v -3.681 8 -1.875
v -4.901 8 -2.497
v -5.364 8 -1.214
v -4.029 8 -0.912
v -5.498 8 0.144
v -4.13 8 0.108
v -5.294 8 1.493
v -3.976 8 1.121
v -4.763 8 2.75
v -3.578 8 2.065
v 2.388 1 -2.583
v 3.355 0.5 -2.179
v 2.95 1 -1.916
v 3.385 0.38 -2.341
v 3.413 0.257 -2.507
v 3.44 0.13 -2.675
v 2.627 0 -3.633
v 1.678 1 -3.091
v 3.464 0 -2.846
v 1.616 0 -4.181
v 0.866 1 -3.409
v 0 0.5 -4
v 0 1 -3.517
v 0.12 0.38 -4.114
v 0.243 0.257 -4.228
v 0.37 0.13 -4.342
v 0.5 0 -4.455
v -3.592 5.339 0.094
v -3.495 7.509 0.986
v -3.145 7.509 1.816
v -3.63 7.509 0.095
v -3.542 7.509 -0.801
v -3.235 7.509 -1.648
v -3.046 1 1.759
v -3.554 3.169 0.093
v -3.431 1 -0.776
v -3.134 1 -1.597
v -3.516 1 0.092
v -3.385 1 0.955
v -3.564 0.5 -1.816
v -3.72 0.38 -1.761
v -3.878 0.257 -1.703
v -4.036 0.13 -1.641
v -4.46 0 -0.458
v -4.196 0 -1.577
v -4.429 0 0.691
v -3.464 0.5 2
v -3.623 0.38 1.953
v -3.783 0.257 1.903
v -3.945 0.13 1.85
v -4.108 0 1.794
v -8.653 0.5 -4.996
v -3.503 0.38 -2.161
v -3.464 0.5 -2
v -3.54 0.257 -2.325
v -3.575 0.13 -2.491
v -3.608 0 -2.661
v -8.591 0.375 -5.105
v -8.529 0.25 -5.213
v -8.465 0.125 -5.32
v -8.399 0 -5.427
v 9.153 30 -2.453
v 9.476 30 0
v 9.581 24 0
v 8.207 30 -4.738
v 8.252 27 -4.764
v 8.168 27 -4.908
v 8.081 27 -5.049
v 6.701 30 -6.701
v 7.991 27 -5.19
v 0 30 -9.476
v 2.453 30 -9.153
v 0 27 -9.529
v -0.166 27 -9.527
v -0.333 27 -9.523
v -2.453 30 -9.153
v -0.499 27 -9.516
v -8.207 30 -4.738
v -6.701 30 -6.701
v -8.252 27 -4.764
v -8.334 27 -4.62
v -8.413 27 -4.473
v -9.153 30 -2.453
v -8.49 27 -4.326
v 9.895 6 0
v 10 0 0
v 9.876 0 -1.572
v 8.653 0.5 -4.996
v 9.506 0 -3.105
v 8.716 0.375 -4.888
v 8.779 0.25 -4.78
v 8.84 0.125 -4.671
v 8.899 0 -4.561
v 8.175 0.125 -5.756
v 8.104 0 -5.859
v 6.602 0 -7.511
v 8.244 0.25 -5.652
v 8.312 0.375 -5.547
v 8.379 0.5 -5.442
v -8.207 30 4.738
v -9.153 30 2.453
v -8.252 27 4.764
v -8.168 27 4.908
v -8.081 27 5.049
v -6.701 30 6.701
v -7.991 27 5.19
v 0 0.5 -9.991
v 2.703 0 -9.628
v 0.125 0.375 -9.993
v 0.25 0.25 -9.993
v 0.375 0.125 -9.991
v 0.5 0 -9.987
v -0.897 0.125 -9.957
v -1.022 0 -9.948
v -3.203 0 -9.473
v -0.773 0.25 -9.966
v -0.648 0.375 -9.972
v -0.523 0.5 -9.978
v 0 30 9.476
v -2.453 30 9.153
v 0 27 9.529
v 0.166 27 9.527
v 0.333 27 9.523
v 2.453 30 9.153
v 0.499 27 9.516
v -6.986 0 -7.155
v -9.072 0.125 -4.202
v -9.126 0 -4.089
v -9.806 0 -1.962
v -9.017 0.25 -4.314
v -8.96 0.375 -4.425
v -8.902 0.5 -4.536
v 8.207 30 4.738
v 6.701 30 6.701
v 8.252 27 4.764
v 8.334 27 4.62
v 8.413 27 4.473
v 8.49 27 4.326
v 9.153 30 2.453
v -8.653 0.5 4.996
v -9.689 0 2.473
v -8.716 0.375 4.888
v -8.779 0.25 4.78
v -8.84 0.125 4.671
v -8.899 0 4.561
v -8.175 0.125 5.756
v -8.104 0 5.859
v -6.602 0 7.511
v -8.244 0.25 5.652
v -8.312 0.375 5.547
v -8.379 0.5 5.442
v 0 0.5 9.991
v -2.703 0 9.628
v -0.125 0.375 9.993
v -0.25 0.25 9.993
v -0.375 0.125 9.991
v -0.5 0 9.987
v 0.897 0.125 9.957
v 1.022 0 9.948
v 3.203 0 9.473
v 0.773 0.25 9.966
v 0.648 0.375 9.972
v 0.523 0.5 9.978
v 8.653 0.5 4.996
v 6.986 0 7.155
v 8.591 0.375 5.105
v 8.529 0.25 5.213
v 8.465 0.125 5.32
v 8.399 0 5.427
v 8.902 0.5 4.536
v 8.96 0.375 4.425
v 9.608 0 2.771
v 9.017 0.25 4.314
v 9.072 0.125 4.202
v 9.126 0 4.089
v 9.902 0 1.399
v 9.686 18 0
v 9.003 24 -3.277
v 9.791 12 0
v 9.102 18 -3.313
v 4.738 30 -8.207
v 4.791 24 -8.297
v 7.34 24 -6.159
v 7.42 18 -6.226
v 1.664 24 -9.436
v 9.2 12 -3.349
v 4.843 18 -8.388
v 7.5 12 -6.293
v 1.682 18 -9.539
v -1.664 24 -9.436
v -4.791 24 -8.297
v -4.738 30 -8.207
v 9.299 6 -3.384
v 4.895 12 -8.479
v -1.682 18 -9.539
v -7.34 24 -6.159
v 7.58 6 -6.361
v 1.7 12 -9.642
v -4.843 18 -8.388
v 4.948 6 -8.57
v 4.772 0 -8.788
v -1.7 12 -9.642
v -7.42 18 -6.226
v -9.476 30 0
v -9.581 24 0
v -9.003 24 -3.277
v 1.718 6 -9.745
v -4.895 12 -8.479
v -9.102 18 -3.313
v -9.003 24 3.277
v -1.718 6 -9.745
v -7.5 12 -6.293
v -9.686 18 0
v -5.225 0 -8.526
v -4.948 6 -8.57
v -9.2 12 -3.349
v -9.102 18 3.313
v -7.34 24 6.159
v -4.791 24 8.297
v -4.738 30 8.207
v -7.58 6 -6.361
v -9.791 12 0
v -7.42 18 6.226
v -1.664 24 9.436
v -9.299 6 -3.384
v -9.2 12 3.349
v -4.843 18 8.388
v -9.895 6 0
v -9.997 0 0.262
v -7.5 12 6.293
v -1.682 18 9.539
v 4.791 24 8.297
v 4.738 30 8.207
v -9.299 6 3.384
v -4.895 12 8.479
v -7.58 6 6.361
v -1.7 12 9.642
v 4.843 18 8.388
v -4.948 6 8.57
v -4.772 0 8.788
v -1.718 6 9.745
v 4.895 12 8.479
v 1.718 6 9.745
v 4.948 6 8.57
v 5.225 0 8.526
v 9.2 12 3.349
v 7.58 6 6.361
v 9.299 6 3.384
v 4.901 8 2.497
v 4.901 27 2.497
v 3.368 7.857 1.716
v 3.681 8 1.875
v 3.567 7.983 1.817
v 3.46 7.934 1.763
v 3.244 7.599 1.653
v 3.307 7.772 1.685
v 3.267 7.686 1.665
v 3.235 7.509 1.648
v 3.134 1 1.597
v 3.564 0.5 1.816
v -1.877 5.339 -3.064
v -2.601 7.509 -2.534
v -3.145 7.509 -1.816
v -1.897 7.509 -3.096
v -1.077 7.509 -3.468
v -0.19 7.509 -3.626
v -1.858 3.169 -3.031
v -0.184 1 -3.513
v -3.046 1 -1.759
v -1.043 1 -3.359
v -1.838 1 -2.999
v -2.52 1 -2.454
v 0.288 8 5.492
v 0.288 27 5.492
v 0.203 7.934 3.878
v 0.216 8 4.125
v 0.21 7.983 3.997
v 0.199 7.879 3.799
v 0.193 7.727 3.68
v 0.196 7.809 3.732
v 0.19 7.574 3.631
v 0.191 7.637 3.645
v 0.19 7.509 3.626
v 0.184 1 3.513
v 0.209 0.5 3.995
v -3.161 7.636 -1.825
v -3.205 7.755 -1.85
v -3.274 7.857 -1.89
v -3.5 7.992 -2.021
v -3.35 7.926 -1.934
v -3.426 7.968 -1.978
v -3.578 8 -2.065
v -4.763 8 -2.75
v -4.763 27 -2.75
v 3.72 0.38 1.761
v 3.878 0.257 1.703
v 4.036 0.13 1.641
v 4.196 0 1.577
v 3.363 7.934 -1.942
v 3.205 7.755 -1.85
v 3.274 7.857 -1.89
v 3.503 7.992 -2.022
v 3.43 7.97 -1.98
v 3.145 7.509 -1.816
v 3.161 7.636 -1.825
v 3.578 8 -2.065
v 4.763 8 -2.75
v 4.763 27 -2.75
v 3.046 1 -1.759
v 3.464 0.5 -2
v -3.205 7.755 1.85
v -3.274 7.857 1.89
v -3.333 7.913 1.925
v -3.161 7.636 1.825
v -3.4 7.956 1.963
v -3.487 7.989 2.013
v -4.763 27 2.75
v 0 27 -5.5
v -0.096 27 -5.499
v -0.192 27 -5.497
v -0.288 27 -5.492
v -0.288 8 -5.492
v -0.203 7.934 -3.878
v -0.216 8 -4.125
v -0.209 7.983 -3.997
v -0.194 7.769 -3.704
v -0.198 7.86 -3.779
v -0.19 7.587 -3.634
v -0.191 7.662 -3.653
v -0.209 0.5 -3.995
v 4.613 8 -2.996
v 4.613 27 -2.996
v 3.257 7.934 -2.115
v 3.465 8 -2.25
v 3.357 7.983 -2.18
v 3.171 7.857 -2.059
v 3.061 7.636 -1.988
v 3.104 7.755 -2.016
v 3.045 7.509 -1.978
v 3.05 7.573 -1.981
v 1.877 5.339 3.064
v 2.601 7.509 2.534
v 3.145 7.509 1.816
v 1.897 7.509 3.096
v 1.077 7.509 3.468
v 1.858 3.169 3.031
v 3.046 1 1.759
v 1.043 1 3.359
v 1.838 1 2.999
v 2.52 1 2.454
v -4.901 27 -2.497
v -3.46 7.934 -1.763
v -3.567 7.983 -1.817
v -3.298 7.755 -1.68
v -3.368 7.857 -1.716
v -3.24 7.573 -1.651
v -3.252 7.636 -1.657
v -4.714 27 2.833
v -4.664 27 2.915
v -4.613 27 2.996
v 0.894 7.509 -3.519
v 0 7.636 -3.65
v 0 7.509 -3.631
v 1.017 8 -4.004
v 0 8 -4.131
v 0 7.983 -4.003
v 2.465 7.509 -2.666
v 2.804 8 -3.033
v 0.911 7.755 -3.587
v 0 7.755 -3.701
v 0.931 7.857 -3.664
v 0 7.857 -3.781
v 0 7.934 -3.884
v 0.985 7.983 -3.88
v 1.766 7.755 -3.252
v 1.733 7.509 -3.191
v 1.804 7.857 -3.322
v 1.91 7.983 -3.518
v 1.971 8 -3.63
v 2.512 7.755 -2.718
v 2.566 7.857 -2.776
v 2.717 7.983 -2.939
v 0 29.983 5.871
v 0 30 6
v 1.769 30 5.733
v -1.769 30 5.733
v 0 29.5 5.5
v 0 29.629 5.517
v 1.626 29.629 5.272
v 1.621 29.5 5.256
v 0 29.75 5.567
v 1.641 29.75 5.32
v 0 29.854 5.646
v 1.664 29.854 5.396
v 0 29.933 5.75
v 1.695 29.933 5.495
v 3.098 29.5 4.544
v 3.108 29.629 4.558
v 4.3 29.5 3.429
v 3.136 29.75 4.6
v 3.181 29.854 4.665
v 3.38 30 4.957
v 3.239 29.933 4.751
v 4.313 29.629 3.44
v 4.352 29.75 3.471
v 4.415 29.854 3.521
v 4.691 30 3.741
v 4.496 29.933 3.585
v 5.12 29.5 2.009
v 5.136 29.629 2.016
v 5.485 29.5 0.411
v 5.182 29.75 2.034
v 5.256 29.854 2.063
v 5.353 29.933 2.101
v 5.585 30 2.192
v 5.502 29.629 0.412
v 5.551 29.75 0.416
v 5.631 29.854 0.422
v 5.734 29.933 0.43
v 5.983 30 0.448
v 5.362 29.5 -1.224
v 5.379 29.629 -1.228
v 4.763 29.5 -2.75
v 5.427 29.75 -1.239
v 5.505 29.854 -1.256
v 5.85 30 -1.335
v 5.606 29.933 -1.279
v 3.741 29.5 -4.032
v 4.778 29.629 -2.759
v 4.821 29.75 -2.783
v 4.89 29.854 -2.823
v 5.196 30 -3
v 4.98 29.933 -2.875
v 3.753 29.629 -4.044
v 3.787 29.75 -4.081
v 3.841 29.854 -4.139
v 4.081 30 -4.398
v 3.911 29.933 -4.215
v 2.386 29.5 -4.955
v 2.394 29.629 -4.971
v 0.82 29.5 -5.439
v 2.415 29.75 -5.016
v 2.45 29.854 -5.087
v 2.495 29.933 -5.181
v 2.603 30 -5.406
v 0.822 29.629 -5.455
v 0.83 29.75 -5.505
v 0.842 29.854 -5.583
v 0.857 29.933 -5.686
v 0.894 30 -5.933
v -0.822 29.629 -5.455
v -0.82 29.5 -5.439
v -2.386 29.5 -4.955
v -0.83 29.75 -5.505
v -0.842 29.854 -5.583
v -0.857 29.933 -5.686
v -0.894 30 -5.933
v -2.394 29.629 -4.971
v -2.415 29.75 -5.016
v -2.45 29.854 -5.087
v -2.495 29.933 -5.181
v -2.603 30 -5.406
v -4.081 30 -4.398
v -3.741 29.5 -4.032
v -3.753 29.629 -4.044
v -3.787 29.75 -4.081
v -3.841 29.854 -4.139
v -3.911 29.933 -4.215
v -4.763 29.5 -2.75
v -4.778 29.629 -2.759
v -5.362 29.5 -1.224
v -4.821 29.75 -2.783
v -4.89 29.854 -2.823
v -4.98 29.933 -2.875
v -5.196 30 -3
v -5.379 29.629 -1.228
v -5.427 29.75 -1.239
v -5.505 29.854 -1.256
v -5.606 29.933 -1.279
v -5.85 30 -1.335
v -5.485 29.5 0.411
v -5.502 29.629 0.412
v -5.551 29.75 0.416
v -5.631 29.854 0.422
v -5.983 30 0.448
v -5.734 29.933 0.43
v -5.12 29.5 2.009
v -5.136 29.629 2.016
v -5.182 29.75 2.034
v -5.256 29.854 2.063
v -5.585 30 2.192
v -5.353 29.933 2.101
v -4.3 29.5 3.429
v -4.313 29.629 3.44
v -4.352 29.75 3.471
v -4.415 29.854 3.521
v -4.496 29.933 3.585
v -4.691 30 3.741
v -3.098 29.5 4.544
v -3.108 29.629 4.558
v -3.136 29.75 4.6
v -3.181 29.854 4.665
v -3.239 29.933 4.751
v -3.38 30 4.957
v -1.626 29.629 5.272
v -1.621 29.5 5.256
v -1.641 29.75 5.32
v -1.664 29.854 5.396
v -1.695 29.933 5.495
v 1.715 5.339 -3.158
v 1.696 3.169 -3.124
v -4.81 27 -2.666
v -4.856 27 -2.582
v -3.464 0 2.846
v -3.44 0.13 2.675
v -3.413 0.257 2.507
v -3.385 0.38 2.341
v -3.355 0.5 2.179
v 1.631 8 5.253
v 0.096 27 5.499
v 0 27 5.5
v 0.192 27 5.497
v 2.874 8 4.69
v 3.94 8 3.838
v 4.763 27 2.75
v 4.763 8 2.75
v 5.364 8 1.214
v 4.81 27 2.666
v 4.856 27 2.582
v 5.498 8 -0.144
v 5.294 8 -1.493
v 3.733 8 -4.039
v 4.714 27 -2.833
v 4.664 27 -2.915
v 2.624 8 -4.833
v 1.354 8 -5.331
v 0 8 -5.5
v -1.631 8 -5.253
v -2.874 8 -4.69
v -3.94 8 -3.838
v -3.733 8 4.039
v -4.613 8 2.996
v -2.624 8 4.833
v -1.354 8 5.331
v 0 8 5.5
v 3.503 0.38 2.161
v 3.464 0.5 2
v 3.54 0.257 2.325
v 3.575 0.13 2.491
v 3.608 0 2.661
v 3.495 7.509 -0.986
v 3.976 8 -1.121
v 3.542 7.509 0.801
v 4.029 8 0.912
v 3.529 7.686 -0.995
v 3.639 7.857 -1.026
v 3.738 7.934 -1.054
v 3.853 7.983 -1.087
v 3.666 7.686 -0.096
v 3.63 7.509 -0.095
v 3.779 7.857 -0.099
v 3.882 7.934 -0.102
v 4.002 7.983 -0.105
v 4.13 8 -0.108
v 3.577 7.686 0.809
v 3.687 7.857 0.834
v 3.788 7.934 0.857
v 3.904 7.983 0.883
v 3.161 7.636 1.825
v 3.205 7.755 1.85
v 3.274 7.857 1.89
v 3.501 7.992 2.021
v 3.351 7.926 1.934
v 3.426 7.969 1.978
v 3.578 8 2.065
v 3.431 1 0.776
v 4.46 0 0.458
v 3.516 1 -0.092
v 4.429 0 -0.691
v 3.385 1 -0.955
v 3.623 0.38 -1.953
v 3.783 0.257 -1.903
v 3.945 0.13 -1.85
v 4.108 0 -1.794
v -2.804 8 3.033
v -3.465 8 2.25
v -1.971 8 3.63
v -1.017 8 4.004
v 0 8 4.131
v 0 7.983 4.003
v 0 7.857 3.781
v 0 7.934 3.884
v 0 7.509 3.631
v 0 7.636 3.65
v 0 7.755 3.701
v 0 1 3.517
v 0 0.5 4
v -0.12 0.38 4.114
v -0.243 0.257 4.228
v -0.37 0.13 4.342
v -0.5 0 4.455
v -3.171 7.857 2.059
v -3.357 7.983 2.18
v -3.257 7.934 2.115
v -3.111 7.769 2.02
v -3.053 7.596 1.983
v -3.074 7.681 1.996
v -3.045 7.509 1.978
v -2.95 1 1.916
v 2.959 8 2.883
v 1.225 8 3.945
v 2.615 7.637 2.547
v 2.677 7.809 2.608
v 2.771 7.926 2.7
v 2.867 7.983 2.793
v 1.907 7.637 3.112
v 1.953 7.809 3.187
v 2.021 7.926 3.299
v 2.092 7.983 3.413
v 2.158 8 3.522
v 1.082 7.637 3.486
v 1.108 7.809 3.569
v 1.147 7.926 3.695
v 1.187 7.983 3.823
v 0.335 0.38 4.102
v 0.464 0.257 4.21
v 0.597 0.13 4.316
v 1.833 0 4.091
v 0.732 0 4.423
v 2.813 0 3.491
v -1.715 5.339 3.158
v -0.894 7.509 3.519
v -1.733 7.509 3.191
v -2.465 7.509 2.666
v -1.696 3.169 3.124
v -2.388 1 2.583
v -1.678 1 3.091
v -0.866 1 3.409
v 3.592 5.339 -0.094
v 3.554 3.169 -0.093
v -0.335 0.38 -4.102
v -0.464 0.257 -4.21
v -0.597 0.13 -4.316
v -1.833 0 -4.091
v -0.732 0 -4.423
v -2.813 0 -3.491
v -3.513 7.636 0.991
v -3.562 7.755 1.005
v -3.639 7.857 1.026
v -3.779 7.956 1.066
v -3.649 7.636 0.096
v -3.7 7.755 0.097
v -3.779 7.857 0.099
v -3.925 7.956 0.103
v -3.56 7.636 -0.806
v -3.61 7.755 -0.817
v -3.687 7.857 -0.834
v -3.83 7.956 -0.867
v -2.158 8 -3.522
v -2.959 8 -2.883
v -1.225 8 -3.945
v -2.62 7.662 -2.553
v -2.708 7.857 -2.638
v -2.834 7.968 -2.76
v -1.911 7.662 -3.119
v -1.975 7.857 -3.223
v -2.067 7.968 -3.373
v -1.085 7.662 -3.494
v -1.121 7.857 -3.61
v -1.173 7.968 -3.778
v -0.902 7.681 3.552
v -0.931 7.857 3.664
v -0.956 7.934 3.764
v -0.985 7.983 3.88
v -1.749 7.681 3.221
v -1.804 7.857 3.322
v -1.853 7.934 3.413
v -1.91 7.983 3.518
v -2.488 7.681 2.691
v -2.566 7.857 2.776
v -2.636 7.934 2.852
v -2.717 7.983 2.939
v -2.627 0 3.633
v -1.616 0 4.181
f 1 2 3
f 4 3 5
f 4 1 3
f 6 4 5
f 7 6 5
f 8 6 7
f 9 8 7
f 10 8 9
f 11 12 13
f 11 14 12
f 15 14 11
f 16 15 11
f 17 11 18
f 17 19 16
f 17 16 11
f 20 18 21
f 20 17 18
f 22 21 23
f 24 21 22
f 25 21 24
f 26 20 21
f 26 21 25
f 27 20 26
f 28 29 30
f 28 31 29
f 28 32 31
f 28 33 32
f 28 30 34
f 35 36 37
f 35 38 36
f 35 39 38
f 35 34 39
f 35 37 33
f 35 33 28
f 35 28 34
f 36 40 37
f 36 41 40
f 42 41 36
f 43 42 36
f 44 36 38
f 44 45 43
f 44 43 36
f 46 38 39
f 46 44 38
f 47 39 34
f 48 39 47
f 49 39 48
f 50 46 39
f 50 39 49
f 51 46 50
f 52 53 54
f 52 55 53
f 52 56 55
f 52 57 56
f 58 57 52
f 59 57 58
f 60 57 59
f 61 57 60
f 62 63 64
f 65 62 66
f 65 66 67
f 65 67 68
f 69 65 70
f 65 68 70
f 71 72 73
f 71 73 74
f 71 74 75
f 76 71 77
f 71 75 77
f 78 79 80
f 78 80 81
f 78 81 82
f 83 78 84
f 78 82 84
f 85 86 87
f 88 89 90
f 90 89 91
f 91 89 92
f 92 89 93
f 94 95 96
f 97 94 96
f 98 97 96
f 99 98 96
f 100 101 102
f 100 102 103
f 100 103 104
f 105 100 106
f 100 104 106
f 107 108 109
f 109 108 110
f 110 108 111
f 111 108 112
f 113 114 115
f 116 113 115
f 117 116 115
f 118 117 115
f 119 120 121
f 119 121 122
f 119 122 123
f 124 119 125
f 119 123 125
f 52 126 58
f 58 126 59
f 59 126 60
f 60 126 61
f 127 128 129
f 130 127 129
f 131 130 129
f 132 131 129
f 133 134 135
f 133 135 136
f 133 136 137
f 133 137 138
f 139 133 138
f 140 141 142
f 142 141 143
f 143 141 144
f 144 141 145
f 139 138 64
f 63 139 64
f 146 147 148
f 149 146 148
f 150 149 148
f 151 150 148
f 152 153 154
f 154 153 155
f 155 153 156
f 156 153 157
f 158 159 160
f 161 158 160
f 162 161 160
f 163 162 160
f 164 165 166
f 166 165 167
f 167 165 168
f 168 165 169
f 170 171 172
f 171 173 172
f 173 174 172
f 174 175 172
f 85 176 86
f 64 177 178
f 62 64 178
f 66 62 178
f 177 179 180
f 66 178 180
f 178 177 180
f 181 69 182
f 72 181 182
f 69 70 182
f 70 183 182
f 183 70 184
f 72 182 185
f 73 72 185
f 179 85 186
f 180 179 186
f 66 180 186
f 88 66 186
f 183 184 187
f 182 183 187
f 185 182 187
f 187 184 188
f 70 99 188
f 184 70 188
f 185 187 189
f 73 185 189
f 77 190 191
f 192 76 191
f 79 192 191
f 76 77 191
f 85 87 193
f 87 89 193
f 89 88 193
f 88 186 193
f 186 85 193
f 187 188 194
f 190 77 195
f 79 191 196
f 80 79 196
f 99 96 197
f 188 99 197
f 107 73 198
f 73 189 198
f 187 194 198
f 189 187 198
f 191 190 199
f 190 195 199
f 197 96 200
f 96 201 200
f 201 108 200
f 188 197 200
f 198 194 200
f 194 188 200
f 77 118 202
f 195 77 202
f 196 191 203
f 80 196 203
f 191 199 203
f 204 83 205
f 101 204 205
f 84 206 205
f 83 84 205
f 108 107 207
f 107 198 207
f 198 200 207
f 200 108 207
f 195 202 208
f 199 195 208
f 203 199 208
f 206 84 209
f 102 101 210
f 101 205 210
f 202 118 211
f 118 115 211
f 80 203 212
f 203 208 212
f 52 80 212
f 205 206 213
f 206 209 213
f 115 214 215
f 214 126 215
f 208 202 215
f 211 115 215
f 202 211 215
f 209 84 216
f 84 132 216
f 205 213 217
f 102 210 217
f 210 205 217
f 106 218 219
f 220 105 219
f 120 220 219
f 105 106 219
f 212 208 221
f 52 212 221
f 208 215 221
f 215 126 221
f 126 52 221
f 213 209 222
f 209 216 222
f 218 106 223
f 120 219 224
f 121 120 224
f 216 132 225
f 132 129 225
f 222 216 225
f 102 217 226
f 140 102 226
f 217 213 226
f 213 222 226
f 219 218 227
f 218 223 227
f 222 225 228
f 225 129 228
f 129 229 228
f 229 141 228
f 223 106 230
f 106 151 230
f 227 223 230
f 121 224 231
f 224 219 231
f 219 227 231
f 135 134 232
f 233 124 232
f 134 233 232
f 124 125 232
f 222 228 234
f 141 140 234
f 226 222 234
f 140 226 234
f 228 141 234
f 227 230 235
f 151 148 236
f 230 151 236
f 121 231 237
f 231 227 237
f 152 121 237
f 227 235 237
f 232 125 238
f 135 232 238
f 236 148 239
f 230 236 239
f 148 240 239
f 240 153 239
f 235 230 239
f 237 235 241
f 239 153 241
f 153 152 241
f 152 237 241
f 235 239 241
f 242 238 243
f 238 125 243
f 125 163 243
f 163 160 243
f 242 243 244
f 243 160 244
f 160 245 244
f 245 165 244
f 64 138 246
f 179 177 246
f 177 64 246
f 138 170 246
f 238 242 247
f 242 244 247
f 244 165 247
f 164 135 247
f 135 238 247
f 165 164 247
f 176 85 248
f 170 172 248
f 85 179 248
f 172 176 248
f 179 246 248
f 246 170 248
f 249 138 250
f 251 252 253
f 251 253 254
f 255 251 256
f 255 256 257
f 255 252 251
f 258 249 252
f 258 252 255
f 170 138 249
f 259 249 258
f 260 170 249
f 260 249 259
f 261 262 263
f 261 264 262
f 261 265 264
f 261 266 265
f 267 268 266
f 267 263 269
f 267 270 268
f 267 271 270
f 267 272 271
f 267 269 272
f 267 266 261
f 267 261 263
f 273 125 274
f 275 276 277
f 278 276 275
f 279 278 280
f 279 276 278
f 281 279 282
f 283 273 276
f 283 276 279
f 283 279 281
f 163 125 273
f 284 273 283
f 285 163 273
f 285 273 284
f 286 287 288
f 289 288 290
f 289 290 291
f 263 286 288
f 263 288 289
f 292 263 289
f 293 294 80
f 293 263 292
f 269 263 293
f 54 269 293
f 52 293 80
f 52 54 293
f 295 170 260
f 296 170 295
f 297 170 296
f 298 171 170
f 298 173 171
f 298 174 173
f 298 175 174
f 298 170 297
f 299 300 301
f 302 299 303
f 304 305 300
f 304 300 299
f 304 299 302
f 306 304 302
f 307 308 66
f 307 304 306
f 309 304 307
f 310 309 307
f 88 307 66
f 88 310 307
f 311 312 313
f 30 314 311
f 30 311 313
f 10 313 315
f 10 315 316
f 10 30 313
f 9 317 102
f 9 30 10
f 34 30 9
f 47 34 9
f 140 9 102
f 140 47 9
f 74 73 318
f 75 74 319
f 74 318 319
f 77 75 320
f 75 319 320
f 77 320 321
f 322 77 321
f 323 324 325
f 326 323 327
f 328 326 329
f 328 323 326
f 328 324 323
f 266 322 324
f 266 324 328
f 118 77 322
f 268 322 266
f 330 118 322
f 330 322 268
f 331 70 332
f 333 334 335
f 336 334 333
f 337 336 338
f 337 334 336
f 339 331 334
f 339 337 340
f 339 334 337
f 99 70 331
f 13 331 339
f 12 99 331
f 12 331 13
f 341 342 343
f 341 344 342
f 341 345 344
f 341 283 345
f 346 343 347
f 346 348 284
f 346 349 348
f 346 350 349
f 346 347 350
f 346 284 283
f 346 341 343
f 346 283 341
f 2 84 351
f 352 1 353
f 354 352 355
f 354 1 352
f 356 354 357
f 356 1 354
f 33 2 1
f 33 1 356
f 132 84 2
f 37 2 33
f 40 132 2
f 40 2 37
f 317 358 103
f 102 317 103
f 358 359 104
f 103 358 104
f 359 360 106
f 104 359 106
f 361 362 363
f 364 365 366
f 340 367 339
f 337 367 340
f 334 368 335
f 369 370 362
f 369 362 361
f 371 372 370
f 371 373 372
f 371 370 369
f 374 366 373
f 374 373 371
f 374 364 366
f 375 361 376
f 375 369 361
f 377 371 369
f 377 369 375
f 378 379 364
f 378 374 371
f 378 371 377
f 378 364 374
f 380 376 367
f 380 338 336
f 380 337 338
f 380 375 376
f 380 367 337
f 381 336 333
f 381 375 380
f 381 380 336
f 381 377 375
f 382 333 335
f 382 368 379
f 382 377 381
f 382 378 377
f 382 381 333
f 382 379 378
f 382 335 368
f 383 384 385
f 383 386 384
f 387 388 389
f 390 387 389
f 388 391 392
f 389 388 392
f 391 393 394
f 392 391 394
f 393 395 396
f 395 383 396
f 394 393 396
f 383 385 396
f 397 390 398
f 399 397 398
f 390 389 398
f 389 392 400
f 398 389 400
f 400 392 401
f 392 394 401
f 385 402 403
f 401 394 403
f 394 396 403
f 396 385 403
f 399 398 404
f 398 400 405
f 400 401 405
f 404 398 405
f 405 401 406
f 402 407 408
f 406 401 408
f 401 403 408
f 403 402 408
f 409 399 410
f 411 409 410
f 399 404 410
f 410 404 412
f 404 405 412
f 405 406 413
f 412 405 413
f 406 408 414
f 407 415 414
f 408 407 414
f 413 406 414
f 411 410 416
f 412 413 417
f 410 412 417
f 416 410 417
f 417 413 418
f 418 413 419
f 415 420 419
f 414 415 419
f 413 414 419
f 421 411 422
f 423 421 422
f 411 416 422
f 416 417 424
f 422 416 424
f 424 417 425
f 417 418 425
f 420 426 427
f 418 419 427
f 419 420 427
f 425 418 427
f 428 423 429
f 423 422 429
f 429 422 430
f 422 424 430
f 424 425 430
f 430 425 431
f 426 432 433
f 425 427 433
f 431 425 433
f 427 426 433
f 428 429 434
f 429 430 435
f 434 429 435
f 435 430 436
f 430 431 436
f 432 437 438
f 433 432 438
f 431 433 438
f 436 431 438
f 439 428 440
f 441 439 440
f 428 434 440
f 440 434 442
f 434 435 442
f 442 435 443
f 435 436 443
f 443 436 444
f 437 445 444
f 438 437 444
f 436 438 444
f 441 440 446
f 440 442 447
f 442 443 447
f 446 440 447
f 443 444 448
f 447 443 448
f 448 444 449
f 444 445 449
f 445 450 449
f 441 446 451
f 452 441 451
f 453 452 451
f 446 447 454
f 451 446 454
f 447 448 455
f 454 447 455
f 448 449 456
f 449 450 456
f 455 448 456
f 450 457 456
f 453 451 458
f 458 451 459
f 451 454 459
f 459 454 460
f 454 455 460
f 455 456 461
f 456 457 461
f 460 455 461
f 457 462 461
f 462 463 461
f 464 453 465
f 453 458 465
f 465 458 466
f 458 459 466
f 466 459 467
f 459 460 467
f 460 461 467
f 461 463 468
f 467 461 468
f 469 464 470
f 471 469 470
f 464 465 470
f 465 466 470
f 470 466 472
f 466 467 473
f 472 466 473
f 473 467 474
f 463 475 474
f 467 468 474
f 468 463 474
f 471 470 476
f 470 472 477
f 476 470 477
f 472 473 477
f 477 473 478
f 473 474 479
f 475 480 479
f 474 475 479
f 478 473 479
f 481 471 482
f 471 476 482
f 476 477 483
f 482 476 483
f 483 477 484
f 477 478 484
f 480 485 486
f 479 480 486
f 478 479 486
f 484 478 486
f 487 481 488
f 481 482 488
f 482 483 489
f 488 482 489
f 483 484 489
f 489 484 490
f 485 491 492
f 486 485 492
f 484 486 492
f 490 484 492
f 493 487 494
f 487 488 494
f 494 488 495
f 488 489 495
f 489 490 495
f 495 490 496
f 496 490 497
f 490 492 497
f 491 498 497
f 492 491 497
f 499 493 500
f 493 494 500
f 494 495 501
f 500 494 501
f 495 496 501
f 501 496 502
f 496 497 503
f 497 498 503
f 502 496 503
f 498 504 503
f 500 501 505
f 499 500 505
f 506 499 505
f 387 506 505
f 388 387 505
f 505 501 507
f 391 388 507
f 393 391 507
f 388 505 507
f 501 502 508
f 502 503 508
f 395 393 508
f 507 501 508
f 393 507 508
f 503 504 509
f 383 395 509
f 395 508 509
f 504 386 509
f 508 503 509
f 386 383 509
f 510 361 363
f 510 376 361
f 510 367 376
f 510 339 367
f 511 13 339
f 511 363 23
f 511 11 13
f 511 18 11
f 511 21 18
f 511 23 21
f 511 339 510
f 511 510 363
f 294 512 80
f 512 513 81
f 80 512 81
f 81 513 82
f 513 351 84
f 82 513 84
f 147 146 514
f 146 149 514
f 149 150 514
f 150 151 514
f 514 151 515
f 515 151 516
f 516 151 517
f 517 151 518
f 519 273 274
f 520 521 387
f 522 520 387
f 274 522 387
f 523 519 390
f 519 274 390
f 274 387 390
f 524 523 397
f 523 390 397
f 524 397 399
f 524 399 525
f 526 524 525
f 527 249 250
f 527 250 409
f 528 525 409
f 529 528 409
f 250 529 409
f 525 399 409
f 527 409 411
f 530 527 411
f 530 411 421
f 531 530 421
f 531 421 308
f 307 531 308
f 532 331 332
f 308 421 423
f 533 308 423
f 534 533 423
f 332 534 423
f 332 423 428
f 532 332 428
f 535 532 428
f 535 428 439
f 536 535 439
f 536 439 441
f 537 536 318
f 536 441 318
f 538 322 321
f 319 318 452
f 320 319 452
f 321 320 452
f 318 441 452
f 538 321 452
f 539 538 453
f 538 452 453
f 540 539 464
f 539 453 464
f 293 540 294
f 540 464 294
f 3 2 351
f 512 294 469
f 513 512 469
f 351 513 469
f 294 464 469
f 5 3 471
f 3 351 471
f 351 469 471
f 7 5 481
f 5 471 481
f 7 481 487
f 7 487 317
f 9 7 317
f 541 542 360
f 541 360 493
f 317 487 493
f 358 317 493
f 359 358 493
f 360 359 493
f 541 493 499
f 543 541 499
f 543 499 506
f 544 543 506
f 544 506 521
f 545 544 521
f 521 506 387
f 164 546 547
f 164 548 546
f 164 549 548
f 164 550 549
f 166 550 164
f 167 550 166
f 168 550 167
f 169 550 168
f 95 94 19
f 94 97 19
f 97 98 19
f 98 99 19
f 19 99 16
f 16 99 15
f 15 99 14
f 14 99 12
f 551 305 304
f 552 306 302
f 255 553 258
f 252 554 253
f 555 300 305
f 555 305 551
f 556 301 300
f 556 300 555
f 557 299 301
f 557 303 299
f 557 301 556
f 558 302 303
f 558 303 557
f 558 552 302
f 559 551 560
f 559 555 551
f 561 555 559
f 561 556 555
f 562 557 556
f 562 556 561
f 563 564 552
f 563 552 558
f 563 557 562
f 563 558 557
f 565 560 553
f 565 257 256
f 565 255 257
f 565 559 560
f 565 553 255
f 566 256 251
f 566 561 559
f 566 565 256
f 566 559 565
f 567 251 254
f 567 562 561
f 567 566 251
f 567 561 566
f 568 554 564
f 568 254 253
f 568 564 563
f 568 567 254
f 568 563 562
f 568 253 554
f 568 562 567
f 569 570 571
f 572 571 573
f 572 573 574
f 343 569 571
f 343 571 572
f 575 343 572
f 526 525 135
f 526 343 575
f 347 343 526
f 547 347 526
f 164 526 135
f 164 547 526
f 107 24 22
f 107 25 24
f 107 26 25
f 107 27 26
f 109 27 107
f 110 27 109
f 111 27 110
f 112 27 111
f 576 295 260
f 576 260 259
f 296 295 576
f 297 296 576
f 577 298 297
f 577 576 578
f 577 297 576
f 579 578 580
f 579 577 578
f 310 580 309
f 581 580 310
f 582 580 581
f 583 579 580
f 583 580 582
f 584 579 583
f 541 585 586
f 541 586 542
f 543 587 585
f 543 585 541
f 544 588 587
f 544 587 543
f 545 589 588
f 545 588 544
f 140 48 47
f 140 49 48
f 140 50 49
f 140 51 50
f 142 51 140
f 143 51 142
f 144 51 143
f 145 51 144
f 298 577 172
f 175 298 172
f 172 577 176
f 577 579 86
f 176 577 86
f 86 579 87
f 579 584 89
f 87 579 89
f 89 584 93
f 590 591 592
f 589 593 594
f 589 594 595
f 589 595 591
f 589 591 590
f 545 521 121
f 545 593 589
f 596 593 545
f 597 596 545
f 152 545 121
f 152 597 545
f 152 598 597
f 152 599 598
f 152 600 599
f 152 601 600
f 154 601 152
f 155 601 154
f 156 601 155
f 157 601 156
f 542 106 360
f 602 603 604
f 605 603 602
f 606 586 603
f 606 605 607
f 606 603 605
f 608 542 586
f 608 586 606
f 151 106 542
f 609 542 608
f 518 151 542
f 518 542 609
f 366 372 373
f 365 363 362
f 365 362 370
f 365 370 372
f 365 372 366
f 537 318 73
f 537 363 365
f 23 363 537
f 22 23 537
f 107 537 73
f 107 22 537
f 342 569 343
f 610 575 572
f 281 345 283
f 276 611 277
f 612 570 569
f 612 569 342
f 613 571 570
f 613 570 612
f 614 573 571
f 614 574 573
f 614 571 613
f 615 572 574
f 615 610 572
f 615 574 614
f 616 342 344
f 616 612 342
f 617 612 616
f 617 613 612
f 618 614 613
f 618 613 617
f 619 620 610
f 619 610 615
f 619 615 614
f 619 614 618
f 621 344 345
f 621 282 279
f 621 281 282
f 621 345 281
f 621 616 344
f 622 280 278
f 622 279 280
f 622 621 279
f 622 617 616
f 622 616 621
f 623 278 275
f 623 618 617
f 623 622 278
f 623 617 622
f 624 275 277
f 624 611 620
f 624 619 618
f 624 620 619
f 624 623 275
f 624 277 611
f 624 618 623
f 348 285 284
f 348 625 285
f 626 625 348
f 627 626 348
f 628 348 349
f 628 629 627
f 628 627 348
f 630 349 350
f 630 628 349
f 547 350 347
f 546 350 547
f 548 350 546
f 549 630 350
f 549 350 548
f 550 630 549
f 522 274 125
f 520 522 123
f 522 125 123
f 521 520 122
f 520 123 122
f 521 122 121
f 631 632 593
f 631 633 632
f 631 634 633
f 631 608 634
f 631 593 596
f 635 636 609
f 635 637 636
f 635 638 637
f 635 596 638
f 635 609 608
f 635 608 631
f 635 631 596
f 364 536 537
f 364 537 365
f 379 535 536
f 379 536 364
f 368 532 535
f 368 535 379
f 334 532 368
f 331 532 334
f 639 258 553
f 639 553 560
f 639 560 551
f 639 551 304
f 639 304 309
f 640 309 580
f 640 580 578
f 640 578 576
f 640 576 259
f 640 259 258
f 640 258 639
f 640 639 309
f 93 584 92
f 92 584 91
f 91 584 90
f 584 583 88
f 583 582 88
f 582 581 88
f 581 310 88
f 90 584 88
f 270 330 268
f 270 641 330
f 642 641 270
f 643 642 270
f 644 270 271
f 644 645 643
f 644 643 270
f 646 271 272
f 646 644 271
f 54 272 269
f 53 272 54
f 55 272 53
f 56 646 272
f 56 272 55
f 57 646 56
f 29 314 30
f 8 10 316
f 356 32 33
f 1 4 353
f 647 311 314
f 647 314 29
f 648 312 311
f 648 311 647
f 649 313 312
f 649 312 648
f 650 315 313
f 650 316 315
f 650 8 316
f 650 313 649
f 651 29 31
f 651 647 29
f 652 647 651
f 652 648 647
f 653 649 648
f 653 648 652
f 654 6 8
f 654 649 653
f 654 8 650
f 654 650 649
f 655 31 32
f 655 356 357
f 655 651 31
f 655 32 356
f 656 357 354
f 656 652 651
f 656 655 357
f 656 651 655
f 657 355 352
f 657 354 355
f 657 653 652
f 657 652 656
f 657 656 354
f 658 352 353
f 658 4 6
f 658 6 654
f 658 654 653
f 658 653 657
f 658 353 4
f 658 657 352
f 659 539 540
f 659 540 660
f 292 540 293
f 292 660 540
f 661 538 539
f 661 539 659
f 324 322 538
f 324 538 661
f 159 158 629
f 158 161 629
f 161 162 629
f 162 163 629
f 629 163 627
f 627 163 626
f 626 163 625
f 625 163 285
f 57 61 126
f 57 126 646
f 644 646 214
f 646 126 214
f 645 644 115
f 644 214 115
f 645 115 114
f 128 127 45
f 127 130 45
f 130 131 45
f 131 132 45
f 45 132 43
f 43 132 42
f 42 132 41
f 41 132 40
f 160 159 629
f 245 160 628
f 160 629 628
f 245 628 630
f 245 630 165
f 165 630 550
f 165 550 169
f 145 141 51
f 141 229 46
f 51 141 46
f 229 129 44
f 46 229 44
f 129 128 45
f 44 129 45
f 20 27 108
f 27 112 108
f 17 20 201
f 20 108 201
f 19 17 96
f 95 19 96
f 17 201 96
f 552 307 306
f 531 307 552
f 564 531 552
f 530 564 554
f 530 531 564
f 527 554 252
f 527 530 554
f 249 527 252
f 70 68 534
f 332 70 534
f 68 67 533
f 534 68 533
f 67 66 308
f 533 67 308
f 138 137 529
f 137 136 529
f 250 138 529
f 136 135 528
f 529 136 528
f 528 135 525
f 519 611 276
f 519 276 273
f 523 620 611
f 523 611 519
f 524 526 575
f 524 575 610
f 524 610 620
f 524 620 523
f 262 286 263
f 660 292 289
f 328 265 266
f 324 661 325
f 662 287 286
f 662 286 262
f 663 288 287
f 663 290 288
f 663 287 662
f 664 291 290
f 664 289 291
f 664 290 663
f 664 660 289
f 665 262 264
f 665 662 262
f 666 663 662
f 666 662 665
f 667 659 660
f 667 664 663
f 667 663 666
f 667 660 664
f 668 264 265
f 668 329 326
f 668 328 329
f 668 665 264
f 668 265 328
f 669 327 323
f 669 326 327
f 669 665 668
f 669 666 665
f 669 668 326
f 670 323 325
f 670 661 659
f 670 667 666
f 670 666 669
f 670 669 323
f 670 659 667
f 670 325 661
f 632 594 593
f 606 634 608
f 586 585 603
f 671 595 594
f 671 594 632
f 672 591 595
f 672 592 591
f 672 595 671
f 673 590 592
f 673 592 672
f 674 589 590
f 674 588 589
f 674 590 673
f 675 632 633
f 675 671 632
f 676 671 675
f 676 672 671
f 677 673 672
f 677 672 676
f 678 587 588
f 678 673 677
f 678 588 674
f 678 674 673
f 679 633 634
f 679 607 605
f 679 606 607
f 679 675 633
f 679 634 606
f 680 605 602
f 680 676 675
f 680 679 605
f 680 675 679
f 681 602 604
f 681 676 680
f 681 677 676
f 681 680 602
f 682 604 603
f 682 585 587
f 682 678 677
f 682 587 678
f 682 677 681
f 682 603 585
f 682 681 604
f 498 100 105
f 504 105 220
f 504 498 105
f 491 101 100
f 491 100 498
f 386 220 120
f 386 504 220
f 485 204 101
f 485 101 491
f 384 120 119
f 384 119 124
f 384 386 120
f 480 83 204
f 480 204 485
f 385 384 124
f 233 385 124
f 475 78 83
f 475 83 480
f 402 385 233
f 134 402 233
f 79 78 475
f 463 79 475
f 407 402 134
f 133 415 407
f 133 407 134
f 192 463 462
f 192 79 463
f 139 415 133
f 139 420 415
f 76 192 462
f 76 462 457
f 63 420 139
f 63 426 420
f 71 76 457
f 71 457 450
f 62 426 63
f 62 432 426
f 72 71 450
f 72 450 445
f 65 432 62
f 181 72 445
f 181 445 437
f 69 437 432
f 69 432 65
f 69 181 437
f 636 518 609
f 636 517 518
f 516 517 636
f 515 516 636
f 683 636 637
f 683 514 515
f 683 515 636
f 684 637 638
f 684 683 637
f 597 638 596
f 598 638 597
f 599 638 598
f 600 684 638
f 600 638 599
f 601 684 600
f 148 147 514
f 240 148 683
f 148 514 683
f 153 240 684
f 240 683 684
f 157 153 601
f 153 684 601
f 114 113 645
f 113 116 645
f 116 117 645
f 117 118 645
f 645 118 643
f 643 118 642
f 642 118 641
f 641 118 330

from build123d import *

# Parameters (mm, degrees)
SKETCH2_R           = 10
SKETCH2_R_2         = 3.5
BOSS_EXTRUDE1_DEPTH = 30
BOSS_EXTRUDE1_DRAFT = 1
SKETCH3_R           = 5.5
CUT_EXTRUDE1_DEPTH  = 22
CHAMFER1_SIZE       = 1
CHAMFER1_SIZE2      = 0.982994102
FILLET1_R           = 0.5
CUT_EXTRUDE2_DEPTH  = 27
CHAMFER2_SIZE       = 0.5
FILLET2_R           = 0.5


with BuildPart() as part:
    # Sketch2 → Boss-Extrude1 (with draft: the straight prism first)
    with BuildSketch(Plane(origin=(0, 0, 0), x_dir=(1, 0, 0), z_dir=(0, 1, 0))):
        Circle(SKETCH2_R)
        Circle(SKETCH2_R_2, mode=Mode.SUBTRACT)
    extrude(amount=BOSS_EXTRUDE1_DEPTH)
    # Boss-Extrude1: the draft: its side faces are tilted about the plane it starts from
    boss_extrude1_sides = [part.faces().sort_by_distance(p)[0] for p in [
        (-10, 15, 0),
        (-3.5, 15, 0),
    ]]
    draft(boss_extrude1_sides, Plane(origin=(0, 0, 0), x_dir=(1, 0, 0), z_dir=(0, 1, 0)), BOSS_EXTRUDE1_DRAFT)

    # Sketch3 → Cut-Extrude1 (cut)
    with BuildSketch(Plane(origin=(0, 30, 0), x_dir=(1, 0, 0), z_dir=(0, 1, 0))):
        with Locations(Location((0, 0, 0), (0, 0, 270))):
            Circle(SKETCH3_R)
    extrude(amount=-CUT_EXTRUDE1_DEPTH, mode=Mode.SUBTRACT)

    # Chamfer1
    chamfer1_edges = [part.edges().sort_by_distance(p)[0] for p in [
        (-3.5, 0, 0),
    ]]
    chamfer1_side = [part.faces().sort_by_distance(p)[0] for p in [
        (-3.56982026, 4, 0),
    ]]
    chamfer(chamfer1_edges, length=CHAMFER1_SIZE, length2=CHAMFER1_SIZE2, reference=chamfer1_side[0])

    # Fillet1
    fillet1_edges = [part.edges().sort_by_distance(p)[0] for p in [
        (-3.639640519, 8, 0),
    ]]
    fillet(fillet1_edges, radius=FILLET1_R)

    # Sketch4 → Cut-Extrude2 (cut)
    with BuildSketch(Plane.XZ):
        with BuildLine():
            Line((0, 3.5), (0, 10))
            ThreePointArc((0, 10), (0.261769483, 9.99657325), (0.523359562, 9.986295348))
            Line((0.523359562, 9.986295348), (0.183175847, 3.495203372))
            ThreePointArc((0.183175847, 3.495203372), (0.091619319, 3.498800637), (0, 3.5))
        make_face()
        with BuildLine():
            Line((3.031088913, 1.75), (8.660254038, 5))
            ThreePointArc((8.660254038, 5), (8.788171127, 4.771587603), (8.910065242, 4.539904997))
            Line((8.910065242, 4.539904997), (3.118522835, 1.588966749))
            ThreePointArc((3.118522835, 1.588966749), (3.075859894, 1.670055661), (3.031088913, 1.75))
        make_face()
        with BuildLine():
            Line((3.031088913, -1.75), (8.660254038, -5))
            ThreePointArc((8.660254038, -5), (8.526401644, -5.224985647), (8.386705679, -5.44639035))
            Line((8.386705679, -5.44639035), (2.935346988, -1.906236623))
            ThreePointArc((2.935346988, -1.906236623), (2.984240575, -1.828744977), (3.031088913, -1.75))
        make_face()
        with BuildLine():
            Line((0, -3.5), (0, -10))
            ThreePointArc((0, -10), (-0.261769483, -9.99657325), (-0.523359562, -9.986295348))
            Line((-0.523359562, -9.986295348), (-0.183175847, -3.495203372))
            ThreePointArc((-0.183175847, -3.495203372), (-0.091619319, -3.498800637), (0, -3.5))
        make_face()
        with BuildLine():
            Line((-3.031088913, -1.75), (-8.660254038, -5))
            ThreePointArc((-8.660254038, -5), (-8.788171127, -4.771587603), (-8.910065242, -4.539904997))
            Line((-8.910065242, -4.539904997), (-3.118522835, -1.588966749))
            ThreePointArc((-3.118522835, -1.588966749), (-3.075859894, -1.670055661), (-3.031088913, -1.75))
        make_face()
        with BuildLine():
            Line((-3.031088913, 1.75), (-8.660254038, 5))
            ThreePointArc((-8.660254038, 5), (-8.526401644, 5.224985647), (-8.386705679, 5.44639035))
            Line((-8.386705679, 5.44639035), (-2.935346988, 1.906236623))
            ThreePointArc((-2.935346988, 1.906236623), (-2.984240575, 1.828744977), (-3.031088913, 1.75))
        make_face()
    extrude(amount=-CUT_EXTRUDE2_DEPTH, mode=Mode.SUBTRACT)

    # Chamfer2
    chamfer2_edges = [part.edges().sort_by_distance(p)[0] for p in [
        (-0.378990673, 0, -7.231572831),
        (0, 0, -7.241497051),
        (-6.452221117, 0, -3.287570865),
        (-6.271320408, 0, -3.620748526),
        (-6.073230445, 0, 3.944001966),
        (-6.271320408, 0, 3.620748526),
        (0.378990673, 0, 7.231572831),
        (0, 0, 7.241497051),
        (6.452221117, 0, 3.287570865),
        (6.271320408, 0, 3.620748526),
        (6.073230445, 0, -3.944001966),
        (6.271320408, 0, -3.620748526),
    ]]
    chamfer(chamfer2_edges, length=CHAMFER2_SIZE)

    # Fillet2
    fillet2_edges = [part.edges().sort_by_distance(p)[0] for p in [
        (0, 30, -5.5),
    ]]
    fillet(fillet2_edges, radius=FILLET2_R)


solid = part.part
